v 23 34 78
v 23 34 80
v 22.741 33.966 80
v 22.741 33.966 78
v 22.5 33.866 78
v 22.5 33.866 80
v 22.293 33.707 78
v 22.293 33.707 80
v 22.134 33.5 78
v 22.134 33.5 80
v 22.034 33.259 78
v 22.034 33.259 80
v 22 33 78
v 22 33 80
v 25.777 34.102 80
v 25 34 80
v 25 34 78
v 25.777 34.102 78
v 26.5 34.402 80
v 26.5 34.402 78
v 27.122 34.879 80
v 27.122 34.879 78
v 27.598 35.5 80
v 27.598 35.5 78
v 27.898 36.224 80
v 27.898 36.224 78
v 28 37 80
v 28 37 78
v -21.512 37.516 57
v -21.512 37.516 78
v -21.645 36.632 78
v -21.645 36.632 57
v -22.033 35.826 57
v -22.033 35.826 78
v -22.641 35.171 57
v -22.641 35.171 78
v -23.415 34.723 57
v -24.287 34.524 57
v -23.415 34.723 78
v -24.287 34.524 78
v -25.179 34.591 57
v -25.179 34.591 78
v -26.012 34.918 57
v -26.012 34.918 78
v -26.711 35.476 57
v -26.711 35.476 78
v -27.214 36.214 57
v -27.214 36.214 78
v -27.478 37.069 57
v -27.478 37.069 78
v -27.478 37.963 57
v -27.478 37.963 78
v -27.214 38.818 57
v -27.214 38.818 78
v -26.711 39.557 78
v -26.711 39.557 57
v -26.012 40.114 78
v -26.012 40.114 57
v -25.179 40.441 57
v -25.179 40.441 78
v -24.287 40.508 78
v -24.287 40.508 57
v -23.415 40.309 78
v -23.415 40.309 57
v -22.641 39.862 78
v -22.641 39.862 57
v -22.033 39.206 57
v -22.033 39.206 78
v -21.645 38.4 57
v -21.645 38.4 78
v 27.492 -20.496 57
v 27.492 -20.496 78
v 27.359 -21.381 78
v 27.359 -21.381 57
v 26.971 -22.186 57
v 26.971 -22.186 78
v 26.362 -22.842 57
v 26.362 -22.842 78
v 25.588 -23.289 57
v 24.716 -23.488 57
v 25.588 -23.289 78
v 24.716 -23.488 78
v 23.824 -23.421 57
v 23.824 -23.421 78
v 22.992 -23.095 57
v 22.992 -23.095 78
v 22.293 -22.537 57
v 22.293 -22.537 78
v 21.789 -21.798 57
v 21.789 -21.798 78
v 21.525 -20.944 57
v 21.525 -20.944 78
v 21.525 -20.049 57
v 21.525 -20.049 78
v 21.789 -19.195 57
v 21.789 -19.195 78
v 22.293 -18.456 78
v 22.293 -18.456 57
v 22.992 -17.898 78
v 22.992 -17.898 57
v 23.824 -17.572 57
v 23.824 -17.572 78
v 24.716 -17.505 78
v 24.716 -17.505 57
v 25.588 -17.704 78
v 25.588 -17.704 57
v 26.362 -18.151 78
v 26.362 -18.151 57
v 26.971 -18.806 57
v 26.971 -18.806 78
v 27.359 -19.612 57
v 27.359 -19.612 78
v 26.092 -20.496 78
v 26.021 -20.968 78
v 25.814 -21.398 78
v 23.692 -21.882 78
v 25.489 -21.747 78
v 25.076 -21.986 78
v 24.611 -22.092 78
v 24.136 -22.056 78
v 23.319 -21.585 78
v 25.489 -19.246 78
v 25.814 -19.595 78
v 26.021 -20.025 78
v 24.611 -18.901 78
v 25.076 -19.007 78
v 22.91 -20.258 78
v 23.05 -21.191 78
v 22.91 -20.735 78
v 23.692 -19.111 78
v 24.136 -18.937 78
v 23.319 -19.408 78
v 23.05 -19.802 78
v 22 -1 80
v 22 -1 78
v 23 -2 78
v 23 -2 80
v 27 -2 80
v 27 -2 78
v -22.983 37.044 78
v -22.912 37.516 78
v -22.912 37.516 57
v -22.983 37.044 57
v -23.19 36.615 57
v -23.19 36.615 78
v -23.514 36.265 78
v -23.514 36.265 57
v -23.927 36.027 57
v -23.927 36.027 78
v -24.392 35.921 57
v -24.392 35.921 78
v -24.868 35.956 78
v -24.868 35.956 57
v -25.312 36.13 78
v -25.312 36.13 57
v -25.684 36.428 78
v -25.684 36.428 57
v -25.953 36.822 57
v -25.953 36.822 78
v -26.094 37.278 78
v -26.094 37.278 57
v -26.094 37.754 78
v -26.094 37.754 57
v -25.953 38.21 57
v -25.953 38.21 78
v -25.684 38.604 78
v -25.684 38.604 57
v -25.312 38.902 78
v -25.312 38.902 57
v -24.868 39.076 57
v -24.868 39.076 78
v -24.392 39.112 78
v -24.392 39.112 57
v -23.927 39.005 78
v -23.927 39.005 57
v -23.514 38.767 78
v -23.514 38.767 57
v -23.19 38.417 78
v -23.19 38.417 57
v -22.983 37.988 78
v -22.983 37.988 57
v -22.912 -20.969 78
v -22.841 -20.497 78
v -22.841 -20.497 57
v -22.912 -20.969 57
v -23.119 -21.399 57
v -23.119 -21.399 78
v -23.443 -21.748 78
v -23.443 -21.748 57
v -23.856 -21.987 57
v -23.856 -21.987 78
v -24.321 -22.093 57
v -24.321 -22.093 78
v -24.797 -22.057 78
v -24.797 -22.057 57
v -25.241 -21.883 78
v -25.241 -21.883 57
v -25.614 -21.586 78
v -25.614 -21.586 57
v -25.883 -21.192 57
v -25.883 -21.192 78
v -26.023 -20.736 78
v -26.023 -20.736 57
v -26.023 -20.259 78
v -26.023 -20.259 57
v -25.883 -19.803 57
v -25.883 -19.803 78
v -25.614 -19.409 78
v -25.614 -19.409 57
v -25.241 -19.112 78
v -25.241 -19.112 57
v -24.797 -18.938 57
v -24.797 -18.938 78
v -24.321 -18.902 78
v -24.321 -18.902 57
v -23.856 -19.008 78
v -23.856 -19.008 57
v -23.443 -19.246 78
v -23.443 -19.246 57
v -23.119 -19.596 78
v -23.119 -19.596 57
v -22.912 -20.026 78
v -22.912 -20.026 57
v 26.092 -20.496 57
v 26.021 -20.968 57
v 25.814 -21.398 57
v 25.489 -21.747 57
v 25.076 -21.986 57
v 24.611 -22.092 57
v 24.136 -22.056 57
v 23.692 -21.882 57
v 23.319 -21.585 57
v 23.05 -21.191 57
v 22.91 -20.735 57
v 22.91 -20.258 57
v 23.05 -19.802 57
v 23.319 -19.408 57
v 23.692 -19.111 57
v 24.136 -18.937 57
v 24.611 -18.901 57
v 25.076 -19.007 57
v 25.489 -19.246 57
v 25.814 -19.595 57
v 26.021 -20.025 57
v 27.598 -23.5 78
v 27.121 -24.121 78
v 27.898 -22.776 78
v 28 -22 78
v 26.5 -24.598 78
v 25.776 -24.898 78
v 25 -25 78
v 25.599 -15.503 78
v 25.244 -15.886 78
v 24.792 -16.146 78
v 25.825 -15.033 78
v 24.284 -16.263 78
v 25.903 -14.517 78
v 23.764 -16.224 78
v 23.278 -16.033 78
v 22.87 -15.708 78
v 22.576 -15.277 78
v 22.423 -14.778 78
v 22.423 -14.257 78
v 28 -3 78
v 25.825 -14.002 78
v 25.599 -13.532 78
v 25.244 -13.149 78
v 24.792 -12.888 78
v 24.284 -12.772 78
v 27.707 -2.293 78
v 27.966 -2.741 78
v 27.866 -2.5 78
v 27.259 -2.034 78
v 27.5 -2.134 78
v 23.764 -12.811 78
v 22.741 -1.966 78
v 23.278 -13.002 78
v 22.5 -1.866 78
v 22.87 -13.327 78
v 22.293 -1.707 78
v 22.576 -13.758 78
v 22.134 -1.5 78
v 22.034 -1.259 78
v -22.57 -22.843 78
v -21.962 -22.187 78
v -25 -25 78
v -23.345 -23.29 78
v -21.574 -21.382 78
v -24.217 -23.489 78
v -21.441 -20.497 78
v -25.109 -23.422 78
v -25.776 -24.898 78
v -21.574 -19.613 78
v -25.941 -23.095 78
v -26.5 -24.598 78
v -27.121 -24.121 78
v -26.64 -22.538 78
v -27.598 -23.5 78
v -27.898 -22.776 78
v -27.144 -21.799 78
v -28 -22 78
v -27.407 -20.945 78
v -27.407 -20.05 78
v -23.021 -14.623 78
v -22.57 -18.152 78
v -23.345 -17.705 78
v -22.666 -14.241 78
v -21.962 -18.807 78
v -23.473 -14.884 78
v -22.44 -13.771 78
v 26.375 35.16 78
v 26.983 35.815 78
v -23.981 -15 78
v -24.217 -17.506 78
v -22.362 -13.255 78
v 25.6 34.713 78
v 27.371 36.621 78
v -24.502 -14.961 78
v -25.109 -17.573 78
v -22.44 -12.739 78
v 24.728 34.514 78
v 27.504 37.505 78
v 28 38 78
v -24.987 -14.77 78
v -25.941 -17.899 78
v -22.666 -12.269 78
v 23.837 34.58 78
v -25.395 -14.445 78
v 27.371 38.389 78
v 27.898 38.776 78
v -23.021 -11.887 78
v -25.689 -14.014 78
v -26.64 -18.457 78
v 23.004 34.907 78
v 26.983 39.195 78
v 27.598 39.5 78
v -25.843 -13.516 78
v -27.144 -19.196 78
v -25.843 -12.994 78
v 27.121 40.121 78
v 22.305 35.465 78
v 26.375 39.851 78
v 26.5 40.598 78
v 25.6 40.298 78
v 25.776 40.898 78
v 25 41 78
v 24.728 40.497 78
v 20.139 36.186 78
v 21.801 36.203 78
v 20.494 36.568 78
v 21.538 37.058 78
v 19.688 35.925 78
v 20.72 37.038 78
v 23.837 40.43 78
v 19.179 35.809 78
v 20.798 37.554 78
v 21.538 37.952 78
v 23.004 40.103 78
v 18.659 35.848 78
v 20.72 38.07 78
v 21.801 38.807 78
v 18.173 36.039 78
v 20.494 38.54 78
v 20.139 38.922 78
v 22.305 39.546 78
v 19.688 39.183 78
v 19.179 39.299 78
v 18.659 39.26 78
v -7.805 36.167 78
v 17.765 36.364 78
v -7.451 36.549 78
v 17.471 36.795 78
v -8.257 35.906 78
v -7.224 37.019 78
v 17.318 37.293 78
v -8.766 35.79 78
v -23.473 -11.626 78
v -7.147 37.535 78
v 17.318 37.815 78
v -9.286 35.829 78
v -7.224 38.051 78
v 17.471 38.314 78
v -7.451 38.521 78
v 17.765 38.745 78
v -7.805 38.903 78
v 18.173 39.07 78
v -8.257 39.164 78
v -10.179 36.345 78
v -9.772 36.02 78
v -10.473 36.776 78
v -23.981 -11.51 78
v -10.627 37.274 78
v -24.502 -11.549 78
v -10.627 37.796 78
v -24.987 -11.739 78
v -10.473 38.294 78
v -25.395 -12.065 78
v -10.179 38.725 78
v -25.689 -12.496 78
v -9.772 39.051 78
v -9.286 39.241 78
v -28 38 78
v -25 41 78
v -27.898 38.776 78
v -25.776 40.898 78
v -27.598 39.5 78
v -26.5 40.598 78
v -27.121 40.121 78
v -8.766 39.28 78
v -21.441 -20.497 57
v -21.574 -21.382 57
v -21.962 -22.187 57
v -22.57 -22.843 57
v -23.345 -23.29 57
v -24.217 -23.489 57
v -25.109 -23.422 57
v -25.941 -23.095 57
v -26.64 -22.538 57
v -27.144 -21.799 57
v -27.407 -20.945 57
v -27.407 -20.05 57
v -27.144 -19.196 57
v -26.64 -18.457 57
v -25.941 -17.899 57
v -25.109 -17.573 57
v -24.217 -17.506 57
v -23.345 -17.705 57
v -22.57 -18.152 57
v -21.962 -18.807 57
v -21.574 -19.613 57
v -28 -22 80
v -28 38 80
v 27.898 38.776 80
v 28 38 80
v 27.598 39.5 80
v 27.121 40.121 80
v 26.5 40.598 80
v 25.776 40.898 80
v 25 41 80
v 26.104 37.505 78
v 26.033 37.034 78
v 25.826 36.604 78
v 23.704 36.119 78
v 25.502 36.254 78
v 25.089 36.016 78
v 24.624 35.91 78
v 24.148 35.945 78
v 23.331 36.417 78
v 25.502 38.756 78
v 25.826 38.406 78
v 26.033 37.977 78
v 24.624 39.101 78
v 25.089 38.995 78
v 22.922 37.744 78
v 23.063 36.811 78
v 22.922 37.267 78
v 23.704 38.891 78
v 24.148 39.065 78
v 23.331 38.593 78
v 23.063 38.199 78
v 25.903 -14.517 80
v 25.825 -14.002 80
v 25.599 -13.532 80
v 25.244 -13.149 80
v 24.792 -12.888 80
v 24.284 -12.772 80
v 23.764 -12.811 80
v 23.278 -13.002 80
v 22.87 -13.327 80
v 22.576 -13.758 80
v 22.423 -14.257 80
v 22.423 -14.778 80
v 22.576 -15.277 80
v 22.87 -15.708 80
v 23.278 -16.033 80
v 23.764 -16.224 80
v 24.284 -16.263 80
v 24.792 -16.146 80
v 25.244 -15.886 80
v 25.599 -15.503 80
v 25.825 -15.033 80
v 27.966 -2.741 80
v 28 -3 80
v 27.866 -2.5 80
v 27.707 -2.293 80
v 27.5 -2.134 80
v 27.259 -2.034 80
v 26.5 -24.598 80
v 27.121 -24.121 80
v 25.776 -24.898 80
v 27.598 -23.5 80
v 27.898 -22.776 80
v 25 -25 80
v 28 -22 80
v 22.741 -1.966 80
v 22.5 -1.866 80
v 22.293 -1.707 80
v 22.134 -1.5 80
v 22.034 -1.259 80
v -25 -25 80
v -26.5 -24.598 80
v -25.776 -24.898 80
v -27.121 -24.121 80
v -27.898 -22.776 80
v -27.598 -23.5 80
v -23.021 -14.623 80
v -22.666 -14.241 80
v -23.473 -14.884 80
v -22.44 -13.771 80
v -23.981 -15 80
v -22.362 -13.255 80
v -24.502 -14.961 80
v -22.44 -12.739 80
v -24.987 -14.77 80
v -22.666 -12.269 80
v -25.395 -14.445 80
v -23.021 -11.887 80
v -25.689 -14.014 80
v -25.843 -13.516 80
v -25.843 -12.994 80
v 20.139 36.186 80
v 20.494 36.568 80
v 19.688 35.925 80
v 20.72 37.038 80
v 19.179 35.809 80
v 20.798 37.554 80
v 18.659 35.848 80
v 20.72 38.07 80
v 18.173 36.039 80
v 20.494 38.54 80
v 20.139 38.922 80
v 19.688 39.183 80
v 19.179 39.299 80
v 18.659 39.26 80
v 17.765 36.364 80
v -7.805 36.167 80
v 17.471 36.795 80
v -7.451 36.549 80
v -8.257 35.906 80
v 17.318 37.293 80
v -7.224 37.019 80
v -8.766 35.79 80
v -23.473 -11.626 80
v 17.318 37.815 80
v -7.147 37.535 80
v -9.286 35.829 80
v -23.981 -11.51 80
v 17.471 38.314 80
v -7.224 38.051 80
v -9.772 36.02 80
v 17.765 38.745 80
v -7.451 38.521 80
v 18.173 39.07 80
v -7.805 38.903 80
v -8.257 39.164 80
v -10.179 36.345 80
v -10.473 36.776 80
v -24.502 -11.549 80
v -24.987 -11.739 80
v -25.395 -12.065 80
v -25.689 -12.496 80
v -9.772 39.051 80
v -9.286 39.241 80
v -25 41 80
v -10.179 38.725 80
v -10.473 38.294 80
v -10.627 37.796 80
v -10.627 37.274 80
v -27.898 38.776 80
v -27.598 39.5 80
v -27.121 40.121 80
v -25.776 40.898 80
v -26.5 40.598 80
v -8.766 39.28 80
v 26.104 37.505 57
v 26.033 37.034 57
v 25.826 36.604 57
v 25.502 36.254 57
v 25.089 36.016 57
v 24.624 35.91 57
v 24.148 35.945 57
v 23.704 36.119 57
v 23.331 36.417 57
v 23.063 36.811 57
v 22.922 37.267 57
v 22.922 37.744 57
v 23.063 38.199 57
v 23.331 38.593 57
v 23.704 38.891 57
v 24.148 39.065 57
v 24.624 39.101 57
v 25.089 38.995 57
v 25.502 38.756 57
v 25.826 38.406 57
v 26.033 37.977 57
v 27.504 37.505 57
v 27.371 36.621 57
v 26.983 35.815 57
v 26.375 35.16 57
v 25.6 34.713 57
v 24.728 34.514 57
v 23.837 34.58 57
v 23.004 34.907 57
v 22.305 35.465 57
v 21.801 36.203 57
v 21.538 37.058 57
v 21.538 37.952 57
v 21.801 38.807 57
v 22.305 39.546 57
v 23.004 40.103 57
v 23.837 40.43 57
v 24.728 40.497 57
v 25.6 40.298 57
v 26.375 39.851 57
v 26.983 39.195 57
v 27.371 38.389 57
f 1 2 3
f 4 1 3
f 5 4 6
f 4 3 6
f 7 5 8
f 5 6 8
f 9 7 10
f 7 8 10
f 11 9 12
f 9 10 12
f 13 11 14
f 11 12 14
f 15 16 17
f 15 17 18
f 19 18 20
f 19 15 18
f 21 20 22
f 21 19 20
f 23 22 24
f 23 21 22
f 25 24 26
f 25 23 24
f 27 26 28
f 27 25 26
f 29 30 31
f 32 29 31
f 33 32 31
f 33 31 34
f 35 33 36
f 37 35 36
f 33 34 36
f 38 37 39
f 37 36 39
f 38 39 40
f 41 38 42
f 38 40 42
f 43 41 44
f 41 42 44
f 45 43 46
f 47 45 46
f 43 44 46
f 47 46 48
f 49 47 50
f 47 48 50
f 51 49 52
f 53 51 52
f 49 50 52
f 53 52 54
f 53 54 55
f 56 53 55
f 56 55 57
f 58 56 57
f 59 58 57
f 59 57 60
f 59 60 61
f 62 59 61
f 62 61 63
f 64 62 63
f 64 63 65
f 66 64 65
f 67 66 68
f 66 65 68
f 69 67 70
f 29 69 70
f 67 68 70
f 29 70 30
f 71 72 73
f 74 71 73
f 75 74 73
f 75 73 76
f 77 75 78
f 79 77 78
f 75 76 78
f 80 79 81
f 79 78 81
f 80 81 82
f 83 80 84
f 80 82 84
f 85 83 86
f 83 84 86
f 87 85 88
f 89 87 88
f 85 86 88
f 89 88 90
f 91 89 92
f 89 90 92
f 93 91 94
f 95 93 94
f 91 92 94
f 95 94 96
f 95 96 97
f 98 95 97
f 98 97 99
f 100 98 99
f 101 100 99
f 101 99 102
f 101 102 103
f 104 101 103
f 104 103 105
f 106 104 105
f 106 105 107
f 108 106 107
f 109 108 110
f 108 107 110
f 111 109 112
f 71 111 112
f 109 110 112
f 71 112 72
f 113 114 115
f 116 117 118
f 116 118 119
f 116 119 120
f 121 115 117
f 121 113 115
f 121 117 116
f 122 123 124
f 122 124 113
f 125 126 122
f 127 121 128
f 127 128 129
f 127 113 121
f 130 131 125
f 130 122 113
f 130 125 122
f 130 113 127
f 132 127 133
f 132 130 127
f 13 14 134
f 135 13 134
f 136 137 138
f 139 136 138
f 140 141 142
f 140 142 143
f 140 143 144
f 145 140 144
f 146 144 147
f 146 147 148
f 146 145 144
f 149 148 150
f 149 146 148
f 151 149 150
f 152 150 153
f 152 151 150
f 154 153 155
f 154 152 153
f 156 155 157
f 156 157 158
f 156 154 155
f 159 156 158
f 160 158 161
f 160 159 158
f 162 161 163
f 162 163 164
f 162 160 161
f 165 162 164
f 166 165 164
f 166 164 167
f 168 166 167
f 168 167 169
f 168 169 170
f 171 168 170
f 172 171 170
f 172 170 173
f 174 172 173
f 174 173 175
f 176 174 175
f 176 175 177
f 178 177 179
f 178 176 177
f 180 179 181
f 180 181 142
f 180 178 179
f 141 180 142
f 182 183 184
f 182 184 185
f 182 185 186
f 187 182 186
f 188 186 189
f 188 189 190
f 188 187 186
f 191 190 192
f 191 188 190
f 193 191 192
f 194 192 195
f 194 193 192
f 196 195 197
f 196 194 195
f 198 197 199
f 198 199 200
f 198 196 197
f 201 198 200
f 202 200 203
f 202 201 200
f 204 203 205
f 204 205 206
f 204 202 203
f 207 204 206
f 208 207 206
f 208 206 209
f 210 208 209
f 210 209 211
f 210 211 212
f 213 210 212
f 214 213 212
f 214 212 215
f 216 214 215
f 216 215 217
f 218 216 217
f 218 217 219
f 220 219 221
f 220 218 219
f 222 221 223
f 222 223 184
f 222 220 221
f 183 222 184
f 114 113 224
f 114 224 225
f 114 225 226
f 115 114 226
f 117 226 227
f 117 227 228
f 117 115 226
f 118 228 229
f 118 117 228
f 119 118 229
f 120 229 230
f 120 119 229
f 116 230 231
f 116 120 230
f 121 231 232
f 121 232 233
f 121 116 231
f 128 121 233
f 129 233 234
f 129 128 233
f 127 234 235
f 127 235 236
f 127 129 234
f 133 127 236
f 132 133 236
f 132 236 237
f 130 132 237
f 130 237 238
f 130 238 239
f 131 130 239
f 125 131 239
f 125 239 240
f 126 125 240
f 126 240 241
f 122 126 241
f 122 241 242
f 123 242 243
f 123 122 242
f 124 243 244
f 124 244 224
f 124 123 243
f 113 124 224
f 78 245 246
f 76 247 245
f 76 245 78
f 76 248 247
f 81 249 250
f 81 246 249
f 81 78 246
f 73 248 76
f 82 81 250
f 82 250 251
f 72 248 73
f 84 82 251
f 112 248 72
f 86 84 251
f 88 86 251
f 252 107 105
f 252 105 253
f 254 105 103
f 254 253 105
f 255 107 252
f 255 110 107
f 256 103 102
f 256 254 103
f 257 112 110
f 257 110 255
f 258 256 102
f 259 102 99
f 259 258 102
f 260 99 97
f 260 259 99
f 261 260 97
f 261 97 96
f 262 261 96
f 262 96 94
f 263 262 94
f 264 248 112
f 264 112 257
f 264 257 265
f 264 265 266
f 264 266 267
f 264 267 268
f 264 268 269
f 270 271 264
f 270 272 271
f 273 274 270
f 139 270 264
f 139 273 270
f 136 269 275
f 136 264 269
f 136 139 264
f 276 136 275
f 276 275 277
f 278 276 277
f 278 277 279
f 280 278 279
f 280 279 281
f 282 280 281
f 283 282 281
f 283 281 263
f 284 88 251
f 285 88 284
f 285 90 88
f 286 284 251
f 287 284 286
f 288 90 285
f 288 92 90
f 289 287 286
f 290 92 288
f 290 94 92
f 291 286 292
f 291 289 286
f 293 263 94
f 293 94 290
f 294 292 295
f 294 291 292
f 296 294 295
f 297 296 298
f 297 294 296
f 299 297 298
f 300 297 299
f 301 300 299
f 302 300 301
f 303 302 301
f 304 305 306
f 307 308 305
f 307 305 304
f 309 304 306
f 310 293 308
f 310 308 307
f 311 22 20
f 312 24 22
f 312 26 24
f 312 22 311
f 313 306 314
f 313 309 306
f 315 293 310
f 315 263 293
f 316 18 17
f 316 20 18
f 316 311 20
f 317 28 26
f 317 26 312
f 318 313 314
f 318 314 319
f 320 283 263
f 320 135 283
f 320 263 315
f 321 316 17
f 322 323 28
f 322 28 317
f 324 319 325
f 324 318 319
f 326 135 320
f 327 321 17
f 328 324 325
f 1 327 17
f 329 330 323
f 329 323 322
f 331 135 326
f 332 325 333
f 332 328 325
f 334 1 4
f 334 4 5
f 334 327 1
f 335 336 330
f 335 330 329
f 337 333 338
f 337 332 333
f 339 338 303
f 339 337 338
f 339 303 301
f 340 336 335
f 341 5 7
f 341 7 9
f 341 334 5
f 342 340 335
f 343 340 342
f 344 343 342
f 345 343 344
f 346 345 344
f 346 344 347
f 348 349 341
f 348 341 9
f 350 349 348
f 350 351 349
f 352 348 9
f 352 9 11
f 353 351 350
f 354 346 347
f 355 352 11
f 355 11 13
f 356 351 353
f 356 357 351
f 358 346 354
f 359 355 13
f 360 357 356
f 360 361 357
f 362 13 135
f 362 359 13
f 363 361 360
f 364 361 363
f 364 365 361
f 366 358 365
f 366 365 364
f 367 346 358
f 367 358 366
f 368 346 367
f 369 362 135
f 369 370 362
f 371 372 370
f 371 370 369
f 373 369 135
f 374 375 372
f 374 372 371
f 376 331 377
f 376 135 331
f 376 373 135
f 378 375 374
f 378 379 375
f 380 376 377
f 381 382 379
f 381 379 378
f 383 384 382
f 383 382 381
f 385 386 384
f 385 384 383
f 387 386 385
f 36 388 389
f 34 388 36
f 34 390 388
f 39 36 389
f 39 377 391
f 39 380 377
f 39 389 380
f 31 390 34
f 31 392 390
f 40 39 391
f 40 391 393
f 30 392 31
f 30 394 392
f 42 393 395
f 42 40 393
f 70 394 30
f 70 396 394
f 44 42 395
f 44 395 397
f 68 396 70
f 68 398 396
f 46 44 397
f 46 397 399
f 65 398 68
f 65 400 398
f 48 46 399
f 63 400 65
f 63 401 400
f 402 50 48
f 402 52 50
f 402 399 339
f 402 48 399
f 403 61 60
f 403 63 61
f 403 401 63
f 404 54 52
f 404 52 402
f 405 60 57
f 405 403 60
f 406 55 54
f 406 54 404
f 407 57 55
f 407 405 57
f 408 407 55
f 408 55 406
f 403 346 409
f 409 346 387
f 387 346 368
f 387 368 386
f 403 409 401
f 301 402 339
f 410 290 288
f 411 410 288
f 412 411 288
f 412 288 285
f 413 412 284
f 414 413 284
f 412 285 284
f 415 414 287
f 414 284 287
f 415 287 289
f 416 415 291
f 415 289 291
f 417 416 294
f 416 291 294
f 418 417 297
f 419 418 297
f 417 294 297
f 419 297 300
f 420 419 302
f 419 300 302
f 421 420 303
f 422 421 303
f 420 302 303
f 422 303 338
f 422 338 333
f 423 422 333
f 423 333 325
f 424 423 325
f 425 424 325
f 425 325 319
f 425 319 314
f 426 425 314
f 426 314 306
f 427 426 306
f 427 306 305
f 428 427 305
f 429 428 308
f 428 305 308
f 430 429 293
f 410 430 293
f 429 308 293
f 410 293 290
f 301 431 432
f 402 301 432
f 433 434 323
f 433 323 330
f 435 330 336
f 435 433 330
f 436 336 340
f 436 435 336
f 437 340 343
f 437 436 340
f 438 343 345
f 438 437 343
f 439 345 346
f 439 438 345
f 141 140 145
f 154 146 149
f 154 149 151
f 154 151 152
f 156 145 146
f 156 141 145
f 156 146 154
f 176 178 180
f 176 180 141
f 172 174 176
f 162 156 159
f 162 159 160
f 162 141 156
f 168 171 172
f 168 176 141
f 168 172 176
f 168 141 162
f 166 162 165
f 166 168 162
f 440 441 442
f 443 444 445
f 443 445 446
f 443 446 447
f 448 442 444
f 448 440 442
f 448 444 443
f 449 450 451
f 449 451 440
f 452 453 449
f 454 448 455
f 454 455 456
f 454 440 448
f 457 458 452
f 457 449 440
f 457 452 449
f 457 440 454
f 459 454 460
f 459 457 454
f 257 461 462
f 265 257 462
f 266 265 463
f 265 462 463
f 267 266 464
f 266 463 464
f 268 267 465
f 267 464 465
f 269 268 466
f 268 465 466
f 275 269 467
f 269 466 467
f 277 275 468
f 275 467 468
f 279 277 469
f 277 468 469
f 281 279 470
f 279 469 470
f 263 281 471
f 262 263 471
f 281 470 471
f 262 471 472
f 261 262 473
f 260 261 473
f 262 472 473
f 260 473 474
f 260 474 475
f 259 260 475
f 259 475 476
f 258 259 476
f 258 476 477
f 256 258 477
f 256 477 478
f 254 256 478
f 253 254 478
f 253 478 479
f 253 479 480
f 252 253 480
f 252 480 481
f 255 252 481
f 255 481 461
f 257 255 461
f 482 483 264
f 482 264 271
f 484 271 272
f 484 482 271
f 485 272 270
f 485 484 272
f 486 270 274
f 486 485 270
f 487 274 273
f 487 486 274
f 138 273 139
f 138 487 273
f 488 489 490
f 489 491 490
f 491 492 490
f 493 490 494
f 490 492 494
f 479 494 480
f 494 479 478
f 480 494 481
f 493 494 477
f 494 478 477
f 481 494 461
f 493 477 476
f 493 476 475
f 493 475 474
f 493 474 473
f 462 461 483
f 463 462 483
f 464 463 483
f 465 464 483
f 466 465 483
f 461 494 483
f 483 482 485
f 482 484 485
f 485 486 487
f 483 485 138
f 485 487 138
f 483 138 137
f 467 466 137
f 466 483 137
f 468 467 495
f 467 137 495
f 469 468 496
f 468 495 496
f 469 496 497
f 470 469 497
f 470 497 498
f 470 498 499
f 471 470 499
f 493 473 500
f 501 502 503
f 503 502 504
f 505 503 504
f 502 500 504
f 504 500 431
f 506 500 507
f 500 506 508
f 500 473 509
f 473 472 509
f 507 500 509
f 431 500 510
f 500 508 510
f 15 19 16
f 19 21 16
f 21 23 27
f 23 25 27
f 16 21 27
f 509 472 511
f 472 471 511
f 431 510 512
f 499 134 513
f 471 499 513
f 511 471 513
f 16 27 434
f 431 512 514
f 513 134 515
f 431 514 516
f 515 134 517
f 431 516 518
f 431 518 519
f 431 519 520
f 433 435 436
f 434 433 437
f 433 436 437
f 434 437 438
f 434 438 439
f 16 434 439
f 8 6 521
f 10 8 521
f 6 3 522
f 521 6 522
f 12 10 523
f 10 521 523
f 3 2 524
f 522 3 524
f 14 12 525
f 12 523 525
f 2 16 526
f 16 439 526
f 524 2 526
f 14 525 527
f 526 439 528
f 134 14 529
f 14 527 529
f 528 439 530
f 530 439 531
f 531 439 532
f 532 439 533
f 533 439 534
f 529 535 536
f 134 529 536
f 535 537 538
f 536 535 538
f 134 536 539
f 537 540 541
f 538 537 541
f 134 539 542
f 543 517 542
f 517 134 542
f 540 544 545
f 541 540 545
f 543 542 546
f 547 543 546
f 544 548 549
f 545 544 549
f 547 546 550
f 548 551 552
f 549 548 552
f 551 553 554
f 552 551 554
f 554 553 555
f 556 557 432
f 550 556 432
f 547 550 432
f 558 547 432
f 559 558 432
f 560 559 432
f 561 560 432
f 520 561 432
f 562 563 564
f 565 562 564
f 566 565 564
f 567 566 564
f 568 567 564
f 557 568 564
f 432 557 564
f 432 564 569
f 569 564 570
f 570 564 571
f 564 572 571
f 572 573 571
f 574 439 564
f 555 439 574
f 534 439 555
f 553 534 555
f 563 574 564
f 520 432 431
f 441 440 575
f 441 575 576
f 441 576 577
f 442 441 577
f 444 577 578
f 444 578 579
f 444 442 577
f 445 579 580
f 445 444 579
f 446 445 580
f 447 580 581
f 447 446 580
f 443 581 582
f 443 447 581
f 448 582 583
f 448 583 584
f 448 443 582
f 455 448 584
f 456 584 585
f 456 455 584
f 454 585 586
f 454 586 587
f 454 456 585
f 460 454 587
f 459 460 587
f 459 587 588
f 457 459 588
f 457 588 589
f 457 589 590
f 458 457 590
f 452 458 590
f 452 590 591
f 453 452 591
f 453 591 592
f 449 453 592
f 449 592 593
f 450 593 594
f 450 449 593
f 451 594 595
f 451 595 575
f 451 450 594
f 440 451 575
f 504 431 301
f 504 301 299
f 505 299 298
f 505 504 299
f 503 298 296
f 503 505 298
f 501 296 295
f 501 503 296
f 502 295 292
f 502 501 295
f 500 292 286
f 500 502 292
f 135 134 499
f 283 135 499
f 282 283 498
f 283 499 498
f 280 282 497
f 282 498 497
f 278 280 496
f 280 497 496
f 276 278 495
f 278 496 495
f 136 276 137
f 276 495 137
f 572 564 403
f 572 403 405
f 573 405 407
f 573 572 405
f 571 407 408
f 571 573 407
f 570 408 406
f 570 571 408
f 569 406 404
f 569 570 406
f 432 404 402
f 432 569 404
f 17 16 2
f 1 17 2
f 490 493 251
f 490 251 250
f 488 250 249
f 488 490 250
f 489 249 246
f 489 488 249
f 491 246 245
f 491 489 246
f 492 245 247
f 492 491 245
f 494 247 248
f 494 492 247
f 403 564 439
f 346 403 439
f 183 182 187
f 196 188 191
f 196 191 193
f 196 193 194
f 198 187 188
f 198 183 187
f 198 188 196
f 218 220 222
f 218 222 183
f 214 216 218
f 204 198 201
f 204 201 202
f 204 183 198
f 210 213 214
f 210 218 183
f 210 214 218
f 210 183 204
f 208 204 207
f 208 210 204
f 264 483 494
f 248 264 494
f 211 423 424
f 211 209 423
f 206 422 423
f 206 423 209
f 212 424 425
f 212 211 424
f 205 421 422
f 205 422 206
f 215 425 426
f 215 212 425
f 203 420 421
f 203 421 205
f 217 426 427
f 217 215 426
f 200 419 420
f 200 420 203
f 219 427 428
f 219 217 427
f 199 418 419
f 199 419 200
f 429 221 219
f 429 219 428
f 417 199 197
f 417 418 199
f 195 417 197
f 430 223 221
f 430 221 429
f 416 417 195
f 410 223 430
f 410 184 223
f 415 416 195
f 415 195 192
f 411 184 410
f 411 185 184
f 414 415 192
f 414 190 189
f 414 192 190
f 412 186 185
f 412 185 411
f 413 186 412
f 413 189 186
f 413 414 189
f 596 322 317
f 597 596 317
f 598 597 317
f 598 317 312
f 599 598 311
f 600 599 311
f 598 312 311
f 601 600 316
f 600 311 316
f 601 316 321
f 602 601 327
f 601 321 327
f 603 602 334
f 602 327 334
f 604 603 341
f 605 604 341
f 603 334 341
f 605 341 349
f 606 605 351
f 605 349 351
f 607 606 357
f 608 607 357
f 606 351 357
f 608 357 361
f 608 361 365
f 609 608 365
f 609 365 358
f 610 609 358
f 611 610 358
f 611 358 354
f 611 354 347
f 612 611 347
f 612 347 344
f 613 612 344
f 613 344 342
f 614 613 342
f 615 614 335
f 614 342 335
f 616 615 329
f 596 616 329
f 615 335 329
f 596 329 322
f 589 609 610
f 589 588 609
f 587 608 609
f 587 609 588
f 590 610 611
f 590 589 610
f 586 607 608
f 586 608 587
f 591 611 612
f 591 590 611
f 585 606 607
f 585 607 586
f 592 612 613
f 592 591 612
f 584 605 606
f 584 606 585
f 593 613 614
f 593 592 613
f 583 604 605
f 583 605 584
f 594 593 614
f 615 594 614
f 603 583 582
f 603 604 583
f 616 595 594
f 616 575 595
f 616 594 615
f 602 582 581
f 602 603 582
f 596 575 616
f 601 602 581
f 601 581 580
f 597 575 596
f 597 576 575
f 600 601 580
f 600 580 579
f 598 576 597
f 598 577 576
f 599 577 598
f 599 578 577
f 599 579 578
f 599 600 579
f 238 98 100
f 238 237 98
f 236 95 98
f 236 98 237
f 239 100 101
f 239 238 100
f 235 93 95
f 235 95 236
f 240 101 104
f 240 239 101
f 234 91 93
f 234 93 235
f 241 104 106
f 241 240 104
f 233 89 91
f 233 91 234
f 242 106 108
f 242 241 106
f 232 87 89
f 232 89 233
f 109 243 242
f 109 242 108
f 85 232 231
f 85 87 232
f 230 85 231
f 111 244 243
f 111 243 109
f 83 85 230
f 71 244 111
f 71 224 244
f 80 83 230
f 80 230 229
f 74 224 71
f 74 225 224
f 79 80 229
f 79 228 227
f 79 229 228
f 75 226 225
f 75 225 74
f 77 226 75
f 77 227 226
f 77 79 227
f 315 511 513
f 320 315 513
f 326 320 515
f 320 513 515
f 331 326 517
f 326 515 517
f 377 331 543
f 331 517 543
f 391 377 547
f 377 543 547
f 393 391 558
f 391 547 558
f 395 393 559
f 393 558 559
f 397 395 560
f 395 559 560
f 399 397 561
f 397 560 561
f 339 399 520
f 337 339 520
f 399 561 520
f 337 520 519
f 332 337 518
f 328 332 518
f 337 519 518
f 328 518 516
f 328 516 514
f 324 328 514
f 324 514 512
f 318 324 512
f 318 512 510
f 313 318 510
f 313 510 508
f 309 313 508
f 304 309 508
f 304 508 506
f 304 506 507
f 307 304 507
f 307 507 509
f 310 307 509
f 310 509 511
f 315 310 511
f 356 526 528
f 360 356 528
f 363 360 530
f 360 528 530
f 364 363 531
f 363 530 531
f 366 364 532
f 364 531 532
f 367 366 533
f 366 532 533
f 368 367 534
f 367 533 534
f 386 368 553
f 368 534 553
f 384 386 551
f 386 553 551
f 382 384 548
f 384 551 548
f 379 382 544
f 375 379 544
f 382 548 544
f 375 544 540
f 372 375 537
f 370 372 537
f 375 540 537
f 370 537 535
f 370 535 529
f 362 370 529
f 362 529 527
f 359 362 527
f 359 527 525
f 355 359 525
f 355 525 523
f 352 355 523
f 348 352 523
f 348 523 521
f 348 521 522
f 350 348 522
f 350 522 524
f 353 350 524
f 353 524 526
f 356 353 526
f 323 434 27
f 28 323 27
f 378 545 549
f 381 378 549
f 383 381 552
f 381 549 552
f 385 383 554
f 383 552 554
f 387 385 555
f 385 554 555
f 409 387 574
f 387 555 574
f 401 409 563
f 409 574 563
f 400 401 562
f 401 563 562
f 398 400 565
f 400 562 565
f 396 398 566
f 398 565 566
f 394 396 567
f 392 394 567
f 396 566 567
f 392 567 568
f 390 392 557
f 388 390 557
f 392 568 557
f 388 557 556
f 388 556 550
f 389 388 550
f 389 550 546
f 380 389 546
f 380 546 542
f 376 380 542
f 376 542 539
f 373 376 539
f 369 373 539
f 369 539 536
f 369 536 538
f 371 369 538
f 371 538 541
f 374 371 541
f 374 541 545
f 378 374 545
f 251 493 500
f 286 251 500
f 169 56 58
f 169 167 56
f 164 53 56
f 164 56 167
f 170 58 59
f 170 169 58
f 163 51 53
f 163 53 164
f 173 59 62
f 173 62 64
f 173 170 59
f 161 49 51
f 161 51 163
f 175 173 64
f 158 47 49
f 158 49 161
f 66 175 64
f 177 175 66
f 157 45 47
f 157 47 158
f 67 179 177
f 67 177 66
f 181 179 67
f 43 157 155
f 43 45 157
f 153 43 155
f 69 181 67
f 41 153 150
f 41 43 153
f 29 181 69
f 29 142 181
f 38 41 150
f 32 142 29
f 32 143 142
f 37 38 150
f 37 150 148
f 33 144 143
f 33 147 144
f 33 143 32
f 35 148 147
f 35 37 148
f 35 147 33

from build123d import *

# Parameters (mm, degrees)
PAD_DEPTH     = 2
SKETCH001_R   = 1.75
POCKET_DEPTH  = 5
SKETCH002_R   = 3
SKETCH002_R_2 = 1.6
PAD001_DEPTH  = 21


with BuildPart() as part:
    # Sketch → Pad (new body)
    with BuildSketch(Plane.XY):
        with BuildLine():
            Line((-25.000066, 40.999736), (24.999953, 40.999736))
            ThreePointArc((28.000009, 38.000002), (27.121199, 40.121154), (24.999953, 40.999736))
            Line((28.000009, 38.000002), (28.000116, 37))
            ThreePointArc((25.000438, 34), (27.121645, 34.878699), (28.000116, 37))
            Line((25.000438, 34), (23, 34))
            ThreePointArc((23, 34), (22.292893, 33.707107), (22, 33))
            Line((22, 33), (22, -1.000001))
            ThreePointArc((22, -1.000001), (22.292893, -1.707108), (23, -2.000001))
            Line((23, -2.000001), (26.999998, -2.000001))
            ThreePointArc((27.999996, -2.999999), (27.707103, -2.292894), (26.999998, -2.000001))
            Line((27.999996, -2.999999), (27.999996, -21.999992))
            ThreePointArc((25.000004, -24.999984), (27.121319, -24.121306), (27.999996, -21.999992))
            Line((25.000004, -24.999984), (-24.999967, -24.999984))
            ThreePointArc((-27.999934, -22.000016), (-27.121264, -24.121314), (-24.999967, -24.999984))
            Line((-27.999934, -22.000016), (-27.999934, 37.999868))
            ThreePointArc((-25.000066, 40.999736), (-27.121293, 40.121095), (-27.999934, 37.999868))
        make_face()
    extrude(amount=-PAD_DEPTH)

    # Sketch001 (on Face16 of Pad) → Pocket (cut)
    with BuildSketch(Plane.XY):
        with Locations((-8.896551, 37.535175)):
            Circle(SKETCH001_R)
        with Locations((19.048174, 37.554218)):
            Circle(SKETCH001_R)
        with Locations((-24.112202, -13.254919)):
            Circle(SKETCH001_R)
        with Locations((24.153093, -14.517437)):
            Circle(SKETCH001_R)
    extrude(amount=-POCKET_DEPTH, mode=Mode.SUBTRACT)

    # Sketch002 (on Face5 of Pocket) → Pad001 (join)
    with BuildSketch(Plane(origin=(0, 0, -2), x_dir=(1, 0, 0), z_dir=(0, 0, -1))):
        with Locations((-24.440964, 20.497406)):
            Circle(SKETCH002_R)
        with Locations((-24.440964, 20.497406)):
            Circle(SKETCH002_R_2, mode=Mode.SUBTRACT)
        with Locations((24.491911, 20.496445)):
            Circle(SKETCH002_R)
        with Locations((24.491911, 20.496445)):
            Circle(SKETCH002_R_2, mode=Mode.SUBTRACT)
        with Locations((-24.511511, -37.516029)):
            Circle(SKETCH002_R)
        with Locations((-24.511511, -37.516029)):
            Circle(SKETCH002_R_2, mode=Mode.SUBTRACT)
        with Locations((24.504074, -37.505135)):
            Circle(SKETCH002_R)
        with Locations((24.504074, -37.505135)):
            Circle(SKETCH002_R_2, mode=Mode.SUBTRACT)
    extrude(amount=PAD001_DEPTH)


with BuildPart() as part_1:
    # Body placement: moved
    add(part.part.moved(Location((0, 0, 24.5))))


with BuildPart() as part_2:
    # Clone placement: moved
    add(part_1.part.moved(Location((0, 0, 55.5))))


solid = part_2.part
